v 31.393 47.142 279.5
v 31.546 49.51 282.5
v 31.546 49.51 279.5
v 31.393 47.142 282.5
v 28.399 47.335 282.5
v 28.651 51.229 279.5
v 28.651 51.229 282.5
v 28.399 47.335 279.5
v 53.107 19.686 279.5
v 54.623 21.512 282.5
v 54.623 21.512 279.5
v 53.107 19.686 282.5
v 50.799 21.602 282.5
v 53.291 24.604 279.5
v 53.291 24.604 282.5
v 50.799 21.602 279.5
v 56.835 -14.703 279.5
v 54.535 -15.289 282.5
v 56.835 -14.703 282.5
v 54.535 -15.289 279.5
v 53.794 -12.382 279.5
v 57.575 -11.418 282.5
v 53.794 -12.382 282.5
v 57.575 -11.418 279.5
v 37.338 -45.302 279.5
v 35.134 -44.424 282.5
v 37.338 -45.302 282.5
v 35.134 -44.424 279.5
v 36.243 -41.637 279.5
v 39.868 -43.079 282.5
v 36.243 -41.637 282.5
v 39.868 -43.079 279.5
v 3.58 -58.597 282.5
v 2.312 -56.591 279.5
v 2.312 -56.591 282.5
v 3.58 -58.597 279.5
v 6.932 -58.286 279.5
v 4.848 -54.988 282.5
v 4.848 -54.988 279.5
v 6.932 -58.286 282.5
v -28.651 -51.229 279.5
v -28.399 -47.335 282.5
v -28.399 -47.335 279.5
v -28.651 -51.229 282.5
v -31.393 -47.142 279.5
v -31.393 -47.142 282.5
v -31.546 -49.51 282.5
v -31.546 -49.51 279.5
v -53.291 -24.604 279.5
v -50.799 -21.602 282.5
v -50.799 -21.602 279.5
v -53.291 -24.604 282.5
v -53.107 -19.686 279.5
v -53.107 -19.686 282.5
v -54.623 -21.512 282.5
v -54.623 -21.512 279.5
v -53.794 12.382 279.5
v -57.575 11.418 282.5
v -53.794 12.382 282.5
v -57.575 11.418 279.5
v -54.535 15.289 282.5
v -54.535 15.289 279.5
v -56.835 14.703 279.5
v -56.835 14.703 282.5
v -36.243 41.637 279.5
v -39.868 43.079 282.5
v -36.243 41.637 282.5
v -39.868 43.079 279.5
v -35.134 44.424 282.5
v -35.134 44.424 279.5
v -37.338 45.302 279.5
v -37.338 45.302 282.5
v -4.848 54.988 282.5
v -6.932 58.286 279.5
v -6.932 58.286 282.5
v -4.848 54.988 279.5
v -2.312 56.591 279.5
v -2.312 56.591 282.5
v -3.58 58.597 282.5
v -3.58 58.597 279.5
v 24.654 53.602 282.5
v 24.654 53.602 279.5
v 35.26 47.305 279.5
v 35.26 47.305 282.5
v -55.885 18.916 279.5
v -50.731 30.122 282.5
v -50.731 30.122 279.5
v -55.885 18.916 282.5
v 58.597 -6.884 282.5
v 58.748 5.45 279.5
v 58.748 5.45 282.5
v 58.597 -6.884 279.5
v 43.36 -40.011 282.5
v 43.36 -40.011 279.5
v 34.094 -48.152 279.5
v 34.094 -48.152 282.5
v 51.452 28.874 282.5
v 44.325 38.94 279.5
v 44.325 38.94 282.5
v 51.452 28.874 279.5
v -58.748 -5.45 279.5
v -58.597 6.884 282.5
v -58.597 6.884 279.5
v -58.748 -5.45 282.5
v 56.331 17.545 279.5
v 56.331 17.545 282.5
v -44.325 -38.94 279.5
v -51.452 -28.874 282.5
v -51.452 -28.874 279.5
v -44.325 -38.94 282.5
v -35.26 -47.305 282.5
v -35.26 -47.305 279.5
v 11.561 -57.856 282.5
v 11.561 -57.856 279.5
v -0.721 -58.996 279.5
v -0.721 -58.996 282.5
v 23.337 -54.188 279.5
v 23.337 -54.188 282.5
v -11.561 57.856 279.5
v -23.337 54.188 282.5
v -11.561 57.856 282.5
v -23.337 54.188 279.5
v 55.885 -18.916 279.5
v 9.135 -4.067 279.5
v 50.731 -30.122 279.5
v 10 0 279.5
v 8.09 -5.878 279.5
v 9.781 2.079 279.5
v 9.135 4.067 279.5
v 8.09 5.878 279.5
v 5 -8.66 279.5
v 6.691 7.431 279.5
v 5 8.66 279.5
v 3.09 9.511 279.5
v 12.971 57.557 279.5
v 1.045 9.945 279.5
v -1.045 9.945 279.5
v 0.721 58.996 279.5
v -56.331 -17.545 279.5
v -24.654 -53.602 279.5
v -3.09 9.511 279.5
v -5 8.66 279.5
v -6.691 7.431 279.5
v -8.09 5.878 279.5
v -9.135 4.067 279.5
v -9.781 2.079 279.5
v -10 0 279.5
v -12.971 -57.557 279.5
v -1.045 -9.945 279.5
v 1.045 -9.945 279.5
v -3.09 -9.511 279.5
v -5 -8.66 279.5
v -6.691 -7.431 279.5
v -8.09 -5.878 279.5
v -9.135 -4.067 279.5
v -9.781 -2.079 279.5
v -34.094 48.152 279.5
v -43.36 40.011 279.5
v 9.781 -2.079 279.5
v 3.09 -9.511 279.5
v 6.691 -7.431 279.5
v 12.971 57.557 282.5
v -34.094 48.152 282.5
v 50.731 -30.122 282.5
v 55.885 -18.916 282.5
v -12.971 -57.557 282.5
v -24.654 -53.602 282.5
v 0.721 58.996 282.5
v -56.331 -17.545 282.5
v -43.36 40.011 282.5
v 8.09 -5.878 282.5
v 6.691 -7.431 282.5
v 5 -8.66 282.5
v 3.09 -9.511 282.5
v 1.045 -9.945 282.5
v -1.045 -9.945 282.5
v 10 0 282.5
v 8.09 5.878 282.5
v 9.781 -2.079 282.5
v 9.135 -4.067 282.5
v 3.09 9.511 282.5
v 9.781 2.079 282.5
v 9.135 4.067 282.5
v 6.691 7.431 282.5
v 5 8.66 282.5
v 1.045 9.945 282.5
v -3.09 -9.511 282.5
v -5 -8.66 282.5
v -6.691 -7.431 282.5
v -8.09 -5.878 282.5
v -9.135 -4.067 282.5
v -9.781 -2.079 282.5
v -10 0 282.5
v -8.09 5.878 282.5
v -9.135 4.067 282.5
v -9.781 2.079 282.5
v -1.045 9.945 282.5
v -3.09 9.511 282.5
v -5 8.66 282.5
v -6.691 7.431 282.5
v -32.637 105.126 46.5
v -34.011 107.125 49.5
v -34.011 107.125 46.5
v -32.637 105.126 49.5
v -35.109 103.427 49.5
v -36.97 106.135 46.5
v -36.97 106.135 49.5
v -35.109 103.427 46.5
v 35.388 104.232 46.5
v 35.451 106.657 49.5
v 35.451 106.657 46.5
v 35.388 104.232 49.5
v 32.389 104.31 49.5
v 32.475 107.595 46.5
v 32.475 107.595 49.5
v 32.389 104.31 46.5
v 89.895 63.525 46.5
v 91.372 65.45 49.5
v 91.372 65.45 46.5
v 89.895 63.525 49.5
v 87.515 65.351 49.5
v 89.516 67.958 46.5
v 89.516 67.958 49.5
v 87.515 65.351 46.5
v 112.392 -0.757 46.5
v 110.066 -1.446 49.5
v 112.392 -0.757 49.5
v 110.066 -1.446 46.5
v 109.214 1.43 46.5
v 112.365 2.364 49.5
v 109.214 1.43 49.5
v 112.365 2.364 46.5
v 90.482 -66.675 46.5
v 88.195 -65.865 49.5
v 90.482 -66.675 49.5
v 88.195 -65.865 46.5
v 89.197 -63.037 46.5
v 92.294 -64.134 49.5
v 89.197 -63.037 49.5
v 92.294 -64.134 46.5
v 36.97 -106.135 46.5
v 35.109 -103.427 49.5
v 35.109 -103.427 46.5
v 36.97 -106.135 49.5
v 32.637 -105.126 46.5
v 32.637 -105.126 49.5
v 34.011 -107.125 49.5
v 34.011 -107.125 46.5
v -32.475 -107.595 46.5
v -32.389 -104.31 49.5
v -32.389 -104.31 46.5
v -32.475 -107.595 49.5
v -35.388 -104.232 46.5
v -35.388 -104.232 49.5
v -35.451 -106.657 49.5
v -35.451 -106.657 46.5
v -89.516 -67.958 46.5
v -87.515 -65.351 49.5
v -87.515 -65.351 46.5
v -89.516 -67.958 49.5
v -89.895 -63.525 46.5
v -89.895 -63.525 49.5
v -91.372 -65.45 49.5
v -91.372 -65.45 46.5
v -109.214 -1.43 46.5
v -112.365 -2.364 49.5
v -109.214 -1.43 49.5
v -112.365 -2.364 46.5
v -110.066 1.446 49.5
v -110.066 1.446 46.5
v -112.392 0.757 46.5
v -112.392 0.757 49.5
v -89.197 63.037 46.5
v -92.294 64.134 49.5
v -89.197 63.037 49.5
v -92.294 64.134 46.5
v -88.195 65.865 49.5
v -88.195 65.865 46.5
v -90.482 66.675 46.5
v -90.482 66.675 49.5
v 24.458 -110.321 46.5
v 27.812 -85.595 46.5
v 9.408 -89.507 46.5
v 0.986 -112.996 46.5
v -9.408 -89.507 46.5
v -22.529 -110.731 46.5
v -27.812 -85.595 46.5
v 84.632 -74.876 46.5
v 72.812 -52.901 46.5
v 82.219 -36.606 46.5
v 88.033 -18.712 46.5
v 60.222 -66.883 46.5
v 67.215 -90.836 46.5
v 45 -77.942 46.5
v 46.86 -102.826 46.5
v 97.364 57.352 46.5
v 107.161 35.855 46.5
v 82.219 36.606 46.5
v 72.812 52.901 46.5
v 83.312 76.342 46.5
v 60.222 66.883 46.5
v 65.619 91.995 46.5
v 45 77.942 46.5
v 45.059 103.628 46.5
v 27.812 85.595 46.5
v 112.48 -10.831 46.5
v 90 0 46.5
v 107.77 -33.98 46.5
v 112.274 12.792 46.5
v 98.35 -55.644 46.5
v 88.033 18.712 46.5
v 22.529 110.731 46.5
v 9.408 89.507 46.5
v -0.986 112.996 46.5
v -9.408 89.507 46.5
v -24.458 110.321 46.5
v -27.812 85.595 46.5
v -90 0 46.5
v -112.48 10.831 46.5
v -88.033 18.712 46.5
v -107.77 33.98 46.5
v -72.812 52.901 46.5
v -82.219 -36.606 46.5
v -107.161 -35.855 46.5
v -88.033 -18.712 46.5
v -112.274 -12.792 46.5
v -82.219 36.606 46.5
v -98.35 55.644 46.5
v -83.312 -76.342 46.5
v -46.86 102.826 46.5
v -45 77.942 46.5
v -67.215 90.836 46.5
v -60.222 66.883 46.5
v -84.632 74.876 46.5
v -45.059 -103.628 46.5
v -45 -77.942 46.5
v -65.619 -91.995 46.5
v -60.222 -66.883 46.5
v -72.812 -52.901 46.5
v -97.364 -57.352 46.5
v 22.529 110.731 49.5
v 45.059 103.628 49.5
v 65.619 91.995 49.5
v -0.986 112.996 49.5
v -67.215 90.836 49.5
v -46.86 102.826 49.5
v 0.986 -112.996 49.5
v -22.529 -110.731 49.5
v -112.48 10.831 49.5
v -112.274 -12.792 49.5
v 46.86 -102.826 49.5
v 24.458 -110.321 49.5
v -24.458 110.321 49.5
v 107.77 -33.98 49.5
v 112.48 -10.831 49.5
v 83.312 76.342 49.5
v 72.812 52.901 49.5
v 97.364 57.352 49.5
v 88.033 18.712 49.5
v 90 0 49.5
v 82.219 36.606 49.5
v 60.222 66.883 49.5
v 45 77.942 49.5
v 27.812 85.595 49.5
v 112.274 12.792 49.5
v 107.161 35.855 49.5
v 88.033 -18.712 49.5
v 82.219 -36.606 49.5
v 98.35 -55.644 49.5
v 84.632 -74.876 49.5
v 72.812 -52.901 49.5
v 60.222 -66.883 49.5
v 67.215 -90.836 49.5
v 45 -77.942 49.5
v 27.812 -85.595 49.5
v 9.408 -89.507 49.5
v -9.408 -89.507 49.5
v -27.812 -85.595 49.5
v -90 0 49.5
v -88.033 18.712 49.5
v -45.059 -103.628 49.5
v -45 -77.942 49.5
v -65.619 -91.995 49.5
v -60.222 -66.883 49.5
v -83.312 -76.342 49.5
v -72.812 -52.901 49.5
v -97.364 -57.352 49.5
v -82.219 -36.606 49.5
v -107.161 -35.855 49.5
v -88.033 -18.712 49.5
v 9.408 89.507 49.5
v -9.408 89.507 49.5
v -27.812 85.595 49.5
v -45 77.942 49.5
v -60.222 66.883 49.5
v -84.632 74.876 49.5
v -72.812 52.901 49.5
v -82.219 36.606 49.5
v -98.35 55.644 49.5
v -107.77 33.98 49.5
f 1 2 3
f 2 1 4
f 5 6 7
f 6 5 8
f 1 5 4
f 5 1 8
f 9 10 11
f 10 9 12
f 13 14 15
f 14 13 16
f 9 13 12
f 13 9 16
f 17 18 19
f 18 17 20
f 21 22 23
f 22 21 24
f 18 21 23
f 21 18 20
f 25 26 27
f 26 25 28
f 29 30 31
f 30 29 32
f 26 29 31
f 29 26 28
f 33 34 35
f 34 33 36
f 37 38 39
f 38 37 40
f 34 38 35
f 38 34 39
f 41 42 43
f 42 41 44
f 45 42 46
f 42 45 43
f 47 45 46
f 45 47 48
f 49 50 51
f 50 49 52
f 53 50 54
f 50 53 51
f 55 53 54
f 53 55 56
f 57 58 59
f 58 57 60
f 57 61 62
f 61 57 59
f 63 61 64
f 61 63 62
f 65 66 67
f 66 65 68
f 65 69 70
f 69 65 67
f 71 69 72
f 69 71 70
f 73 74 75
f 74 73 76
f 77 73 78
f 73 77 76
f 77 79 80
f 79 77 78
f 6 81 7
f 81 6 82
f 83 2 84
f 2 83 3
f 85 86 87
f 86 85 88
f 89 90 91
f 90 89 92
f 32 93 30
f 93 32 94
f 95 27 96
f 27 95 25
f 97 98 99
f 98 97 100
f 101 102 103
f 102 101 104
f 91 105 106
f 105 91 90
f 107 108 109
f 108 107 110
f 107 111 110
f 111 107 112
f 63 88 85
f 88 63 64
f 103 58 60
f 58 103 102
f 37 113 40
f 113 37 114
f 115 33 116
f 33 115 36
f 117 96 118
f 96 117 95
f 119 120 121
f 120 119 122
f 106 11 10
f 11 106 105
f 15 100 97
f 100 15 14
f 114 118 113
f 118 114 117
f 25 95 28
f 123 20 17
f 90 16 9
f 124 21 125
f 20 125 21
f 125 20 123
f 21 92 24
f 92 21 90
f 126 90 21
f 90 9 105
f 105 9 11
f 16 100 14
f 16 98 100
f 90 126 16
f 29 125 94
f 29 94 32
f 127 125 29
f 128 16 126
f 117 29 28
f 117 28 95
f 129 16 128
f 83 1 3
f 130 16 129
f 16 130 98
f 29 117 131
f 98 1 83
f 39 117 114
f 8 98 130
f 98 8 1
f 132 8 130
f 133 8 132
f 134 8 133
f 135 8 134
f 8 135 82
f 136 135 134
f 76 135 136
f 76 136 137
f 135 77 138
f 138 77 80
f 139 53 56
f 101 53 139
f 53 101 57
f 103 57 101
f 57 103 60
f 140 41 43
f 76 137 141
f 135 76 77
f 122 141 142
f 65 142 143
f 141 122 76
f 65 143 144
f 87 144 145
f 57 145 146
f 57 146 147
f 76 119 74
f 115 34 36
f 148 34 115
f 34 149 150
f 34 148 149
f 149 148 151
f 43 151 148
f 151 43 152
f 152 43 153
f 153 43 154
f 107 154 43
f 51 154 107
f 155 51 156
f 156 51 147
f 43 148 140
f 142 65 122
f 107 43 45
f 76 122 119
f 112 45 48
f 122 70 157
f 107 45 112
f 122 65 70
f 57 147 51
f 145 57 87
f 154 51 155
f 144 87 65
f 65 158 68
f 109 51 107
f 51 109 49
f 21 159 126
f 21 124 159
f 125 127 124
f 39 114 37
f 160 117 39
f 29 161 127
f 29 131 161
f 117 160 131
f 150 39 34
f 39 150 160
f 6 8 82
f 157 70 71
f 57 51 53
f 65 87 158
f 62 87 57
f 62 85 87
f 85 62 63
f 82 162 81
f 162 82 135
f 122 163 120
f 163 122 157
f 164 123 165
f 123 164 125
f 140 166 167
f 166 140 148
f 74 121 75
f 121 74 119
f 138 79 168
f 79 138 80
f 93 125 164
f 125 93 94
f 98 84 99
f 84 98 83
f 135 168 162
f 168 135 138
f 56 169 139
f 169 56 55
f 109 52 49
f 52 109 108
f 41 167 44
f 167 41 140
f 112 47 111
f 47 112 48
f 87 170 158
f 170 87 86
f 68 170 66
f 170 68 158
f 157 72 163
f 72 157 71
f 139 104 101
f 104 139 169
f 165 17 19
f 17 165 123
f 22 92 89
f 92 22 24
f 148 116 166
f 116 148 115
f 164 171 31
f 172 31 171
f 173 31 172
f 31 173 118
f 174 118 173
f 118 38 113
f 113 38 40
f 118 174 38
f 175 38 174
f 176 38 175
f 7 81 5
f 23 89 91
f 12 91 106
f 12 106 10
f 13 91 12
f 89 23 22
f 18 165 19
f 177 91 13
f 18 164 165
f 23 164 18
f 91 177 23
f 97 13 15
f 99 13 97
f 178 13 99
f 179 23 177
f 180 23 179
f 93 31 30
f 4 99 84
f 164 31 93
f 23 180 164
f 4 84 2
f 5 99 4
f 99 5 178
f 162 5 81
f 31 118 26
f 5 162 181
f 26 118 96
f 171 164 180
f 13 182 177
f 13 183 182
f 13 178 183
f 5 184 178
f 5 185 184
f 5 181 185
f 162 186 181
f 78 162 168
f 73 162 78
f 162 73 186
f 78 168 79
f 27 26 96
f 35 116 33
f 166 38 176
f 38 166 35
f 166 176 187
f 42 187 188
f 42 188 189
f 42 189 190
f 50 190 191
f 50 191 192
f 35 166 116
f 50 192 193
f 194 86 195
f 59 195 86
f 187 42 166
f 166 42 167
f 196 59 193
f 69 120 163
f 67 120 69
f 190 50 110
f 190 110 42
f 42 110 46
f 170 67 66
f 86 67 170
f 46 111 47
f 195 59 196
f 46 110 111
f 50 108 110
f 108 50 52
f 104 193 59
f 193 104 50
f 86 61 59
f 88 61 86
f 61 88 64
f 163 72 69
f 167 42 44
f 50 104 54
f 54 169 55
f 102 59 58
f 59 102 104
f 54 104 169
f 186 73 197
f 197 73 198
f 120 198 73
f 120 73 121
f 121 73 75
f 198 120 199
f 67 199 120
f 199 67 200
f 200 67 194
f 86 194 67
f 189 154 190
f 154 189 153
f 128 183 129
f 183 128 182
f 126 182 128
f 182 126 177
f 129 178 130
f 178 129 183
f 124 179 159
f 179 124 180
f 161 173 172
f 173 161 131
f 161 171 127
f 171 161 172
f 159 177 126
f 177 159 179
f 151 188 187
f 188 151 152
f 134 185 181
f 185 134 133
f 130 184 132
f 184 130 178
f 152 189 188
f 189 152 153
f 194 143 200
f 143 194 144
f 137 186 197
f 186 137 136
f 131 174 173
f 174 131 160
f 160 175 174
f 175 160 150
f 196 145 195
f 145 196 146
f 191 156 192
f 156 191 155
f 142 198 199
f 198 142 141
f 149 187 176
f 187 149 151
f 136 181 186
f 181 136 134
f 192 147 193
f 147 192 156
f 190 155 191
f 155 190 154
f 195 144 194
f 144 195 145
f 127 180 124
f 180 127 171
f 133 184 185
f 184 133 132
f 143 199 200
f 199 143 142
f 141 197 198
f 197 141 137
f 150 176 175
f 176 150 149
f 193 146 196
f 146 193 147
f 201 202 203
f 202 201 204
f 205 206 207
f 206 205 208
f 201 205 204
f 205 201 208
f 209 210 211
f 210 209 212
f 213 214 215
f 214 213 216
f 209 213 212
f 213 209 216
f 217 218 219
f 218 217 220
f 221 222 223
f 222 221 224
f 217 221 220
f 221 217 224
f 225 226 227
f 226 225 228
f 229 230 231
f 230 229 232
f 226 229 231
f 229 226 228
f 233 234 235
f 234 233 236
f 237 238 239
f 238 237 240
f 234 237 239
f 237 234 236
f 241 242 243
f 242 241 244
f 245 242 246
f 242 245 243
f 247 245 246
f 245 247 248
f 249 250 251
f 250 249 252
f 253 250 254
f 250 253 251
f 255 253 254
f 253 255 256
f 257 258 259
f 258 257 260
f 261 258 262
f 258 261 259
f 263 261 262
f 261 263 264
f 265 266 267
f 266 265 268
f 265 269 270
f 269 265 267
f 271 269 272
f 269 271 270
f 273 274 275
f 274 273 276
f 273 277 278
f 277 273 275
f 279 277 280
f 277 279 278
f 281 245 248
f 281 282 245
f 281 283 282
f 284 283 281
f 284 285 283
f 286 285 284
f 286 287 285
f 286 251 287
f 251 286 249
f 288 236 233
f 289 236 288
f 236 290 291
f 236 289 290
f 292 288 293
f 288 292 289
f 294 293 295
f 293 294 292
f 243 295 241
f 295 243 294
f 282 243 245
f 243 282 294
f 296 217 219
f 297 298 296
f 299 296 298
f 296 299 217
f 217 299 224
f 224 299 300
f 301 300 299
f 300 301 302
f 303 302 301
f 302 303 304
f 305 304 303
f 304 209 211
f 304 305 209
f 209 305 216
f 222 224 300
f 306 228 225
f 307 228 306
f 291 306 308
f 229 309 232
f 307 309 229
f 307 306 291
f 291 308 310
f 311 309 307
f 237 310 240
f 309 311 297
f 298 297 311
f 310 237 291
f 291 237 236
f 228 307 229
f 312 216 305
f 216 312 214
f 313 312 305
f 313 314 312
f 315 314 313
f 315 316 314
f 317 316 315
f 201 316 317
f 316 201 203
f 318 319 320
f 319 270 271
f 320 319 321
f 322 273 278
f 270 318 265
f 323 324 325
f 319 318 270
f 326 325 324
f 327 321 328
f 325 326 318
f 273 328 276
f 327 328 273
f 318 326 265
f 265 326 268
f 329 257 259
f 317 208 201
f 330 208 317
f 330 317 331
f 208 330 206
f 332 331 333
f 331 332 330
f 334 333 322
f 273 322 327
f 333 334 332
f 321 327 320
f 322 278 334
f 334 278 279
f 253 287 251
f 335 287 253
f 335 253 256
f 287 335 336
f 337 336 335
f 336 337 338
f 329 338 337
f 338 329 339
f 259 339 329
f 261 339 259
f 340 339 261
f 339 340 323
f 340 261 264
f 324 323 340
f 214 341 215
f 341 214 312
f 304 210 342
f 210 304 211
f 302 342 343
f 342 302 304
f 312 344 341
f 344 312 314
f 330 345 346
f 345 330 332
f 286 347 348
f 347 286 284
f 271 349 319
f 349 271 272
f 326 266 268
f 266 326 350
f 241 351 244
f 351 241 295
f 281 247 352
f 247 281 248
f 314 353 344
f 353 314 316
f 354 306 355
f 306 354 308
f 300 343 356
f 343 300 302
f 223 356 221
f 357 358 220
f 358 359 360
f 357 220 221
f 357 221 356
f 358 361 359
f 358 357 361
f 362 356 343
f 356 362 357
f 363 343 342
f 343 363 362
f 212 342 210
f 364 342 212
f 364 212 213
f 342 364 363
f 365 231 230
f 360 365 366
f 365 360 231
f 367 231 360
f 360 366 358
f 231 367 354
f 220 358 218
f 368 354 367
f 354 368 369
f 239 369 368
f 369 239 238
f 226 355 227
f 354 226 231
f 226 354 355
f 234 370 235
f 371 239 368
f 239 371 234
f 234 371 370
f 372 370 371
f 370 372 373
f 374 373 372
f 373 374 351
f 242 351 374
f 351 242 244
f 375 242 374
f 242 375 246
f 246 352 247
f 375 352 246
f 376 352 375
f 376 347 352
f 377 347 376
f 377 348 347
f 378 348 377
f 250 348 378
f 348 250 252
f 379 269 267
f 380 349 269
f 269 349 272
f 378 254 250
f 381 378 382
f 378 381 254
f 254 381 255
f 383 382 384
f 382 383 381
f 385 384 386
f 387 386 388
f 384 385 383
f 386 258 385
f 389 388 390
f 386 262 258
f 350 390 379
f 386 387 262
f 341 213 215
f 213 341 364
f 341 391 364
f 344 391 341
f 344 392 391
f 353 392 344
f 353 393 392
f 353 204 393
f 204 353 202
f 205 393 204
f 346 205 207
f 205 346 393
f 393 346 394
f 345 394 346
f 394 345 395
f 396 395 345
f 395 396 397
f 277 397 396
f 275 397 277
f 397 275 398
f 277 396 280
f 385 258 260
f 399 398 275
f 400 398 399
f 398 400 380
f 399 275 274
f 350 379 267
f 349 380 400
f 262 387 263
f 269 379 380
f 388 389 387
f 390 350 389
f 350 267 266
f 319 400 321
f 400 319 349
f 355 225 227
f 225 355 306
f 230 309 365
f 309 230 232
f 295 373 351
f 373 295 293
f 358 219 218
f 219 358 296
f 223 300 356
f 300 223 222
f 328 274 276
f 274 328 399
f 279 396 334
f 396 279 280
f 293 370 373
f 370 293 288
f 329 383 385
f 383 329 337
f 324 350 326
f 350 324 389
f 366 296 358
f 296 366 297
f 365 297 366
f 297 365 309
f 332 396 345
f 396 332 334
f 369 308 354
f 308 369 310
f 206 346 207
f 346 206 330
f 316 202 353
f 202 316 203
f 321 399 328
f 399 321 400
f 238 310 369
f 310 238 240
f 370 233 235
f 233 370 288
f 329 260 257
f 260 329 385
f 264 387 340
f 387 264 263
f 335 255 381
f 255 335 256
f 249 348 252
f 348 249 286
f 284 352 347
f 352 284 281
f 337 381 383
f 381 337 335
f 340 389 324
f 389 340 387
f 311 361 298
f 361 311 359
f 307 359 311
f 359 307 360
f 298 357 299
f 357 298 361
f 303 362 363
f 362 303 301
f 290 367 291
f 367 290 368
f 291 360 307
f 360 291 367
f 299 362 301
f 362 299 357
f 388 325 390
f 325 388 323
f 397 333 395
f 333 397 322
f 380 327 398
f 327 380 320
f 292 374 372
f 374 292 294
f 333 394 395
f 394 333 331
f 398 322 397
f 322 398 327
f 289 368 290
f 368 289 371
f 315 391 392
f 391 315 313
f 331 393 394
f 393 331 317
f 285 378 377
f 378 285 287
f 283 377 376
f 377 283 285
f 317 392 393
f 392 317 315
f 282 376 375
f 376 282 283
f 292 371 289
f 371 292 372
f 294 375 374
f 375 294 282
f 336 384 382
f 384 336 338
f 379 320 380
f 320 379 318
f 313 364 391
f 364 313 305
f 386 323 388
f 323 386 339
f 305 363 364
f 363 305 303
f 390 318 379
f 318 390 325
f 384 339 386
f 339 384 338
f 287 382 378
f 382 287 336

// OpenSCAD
//constants
mat_thickness = 3;
fins = 10;
height = 300;
fintilt = 15;
connectors = 10;

module anchor(radius,twist) {
    difference(){
        cylinder(r=radius,h=mat_thickness);
        for(i = [1:connectors]) {
            translate([sin(360*i/connectors)*radius , cos(360*i/connectors)*radius, 0 ])
            rotate(-360*i/connectors + twist -4, [0, 0, 1])
            cube([mat_thickness,7,mat_thickness+5],center=true);
        }
    }
}






//top anchor
translate([0,0,279.5])
difference(){
    rotate([0,0,5.3])
    anchor(59,31);
        
    translate([0,0,-1])
    cylinder(r=10,h=10); // hole for cable and fixture      
}

//bottom anchor
translate([0,0,46.5])
difference() {
rotate([0,0,54.5])
anchor(113,20);
    translate([0,0,-1])
    cylinder(r=90,h=10);
}

radius = 50;
for(i = [1:connectors]) {
translate([sin(360*i/connectors)*radius, cos(360*i/connectors)*radius, 0 ])
rotate(-360*i/connectors +122, [0, 0, 1])
translate([-1.5,-mat_thickness +4.5,0])
    rotate([90,0,0])
    rotate([0,0,fintilt])
    translate([70,0,0])
fin();

}



module fin() {
    notch_offset = 30;
    notch_depth = 5;
    difference() {    
        linear_extrude(height = mat_thickness) 
        import("drawing.dxf");
        //bottom notch
        translate([-2,notch_offset,0])
        rotate([0,0,-fintilt])
        cube([7,mat_thickness,notch_depth ]);
        //top notch
        translate([2,height - notch_offset,0])
        rotate([0,0,-fintilt])
        cube([10,mat_thickness,notch_depth]);
    }
    
}
